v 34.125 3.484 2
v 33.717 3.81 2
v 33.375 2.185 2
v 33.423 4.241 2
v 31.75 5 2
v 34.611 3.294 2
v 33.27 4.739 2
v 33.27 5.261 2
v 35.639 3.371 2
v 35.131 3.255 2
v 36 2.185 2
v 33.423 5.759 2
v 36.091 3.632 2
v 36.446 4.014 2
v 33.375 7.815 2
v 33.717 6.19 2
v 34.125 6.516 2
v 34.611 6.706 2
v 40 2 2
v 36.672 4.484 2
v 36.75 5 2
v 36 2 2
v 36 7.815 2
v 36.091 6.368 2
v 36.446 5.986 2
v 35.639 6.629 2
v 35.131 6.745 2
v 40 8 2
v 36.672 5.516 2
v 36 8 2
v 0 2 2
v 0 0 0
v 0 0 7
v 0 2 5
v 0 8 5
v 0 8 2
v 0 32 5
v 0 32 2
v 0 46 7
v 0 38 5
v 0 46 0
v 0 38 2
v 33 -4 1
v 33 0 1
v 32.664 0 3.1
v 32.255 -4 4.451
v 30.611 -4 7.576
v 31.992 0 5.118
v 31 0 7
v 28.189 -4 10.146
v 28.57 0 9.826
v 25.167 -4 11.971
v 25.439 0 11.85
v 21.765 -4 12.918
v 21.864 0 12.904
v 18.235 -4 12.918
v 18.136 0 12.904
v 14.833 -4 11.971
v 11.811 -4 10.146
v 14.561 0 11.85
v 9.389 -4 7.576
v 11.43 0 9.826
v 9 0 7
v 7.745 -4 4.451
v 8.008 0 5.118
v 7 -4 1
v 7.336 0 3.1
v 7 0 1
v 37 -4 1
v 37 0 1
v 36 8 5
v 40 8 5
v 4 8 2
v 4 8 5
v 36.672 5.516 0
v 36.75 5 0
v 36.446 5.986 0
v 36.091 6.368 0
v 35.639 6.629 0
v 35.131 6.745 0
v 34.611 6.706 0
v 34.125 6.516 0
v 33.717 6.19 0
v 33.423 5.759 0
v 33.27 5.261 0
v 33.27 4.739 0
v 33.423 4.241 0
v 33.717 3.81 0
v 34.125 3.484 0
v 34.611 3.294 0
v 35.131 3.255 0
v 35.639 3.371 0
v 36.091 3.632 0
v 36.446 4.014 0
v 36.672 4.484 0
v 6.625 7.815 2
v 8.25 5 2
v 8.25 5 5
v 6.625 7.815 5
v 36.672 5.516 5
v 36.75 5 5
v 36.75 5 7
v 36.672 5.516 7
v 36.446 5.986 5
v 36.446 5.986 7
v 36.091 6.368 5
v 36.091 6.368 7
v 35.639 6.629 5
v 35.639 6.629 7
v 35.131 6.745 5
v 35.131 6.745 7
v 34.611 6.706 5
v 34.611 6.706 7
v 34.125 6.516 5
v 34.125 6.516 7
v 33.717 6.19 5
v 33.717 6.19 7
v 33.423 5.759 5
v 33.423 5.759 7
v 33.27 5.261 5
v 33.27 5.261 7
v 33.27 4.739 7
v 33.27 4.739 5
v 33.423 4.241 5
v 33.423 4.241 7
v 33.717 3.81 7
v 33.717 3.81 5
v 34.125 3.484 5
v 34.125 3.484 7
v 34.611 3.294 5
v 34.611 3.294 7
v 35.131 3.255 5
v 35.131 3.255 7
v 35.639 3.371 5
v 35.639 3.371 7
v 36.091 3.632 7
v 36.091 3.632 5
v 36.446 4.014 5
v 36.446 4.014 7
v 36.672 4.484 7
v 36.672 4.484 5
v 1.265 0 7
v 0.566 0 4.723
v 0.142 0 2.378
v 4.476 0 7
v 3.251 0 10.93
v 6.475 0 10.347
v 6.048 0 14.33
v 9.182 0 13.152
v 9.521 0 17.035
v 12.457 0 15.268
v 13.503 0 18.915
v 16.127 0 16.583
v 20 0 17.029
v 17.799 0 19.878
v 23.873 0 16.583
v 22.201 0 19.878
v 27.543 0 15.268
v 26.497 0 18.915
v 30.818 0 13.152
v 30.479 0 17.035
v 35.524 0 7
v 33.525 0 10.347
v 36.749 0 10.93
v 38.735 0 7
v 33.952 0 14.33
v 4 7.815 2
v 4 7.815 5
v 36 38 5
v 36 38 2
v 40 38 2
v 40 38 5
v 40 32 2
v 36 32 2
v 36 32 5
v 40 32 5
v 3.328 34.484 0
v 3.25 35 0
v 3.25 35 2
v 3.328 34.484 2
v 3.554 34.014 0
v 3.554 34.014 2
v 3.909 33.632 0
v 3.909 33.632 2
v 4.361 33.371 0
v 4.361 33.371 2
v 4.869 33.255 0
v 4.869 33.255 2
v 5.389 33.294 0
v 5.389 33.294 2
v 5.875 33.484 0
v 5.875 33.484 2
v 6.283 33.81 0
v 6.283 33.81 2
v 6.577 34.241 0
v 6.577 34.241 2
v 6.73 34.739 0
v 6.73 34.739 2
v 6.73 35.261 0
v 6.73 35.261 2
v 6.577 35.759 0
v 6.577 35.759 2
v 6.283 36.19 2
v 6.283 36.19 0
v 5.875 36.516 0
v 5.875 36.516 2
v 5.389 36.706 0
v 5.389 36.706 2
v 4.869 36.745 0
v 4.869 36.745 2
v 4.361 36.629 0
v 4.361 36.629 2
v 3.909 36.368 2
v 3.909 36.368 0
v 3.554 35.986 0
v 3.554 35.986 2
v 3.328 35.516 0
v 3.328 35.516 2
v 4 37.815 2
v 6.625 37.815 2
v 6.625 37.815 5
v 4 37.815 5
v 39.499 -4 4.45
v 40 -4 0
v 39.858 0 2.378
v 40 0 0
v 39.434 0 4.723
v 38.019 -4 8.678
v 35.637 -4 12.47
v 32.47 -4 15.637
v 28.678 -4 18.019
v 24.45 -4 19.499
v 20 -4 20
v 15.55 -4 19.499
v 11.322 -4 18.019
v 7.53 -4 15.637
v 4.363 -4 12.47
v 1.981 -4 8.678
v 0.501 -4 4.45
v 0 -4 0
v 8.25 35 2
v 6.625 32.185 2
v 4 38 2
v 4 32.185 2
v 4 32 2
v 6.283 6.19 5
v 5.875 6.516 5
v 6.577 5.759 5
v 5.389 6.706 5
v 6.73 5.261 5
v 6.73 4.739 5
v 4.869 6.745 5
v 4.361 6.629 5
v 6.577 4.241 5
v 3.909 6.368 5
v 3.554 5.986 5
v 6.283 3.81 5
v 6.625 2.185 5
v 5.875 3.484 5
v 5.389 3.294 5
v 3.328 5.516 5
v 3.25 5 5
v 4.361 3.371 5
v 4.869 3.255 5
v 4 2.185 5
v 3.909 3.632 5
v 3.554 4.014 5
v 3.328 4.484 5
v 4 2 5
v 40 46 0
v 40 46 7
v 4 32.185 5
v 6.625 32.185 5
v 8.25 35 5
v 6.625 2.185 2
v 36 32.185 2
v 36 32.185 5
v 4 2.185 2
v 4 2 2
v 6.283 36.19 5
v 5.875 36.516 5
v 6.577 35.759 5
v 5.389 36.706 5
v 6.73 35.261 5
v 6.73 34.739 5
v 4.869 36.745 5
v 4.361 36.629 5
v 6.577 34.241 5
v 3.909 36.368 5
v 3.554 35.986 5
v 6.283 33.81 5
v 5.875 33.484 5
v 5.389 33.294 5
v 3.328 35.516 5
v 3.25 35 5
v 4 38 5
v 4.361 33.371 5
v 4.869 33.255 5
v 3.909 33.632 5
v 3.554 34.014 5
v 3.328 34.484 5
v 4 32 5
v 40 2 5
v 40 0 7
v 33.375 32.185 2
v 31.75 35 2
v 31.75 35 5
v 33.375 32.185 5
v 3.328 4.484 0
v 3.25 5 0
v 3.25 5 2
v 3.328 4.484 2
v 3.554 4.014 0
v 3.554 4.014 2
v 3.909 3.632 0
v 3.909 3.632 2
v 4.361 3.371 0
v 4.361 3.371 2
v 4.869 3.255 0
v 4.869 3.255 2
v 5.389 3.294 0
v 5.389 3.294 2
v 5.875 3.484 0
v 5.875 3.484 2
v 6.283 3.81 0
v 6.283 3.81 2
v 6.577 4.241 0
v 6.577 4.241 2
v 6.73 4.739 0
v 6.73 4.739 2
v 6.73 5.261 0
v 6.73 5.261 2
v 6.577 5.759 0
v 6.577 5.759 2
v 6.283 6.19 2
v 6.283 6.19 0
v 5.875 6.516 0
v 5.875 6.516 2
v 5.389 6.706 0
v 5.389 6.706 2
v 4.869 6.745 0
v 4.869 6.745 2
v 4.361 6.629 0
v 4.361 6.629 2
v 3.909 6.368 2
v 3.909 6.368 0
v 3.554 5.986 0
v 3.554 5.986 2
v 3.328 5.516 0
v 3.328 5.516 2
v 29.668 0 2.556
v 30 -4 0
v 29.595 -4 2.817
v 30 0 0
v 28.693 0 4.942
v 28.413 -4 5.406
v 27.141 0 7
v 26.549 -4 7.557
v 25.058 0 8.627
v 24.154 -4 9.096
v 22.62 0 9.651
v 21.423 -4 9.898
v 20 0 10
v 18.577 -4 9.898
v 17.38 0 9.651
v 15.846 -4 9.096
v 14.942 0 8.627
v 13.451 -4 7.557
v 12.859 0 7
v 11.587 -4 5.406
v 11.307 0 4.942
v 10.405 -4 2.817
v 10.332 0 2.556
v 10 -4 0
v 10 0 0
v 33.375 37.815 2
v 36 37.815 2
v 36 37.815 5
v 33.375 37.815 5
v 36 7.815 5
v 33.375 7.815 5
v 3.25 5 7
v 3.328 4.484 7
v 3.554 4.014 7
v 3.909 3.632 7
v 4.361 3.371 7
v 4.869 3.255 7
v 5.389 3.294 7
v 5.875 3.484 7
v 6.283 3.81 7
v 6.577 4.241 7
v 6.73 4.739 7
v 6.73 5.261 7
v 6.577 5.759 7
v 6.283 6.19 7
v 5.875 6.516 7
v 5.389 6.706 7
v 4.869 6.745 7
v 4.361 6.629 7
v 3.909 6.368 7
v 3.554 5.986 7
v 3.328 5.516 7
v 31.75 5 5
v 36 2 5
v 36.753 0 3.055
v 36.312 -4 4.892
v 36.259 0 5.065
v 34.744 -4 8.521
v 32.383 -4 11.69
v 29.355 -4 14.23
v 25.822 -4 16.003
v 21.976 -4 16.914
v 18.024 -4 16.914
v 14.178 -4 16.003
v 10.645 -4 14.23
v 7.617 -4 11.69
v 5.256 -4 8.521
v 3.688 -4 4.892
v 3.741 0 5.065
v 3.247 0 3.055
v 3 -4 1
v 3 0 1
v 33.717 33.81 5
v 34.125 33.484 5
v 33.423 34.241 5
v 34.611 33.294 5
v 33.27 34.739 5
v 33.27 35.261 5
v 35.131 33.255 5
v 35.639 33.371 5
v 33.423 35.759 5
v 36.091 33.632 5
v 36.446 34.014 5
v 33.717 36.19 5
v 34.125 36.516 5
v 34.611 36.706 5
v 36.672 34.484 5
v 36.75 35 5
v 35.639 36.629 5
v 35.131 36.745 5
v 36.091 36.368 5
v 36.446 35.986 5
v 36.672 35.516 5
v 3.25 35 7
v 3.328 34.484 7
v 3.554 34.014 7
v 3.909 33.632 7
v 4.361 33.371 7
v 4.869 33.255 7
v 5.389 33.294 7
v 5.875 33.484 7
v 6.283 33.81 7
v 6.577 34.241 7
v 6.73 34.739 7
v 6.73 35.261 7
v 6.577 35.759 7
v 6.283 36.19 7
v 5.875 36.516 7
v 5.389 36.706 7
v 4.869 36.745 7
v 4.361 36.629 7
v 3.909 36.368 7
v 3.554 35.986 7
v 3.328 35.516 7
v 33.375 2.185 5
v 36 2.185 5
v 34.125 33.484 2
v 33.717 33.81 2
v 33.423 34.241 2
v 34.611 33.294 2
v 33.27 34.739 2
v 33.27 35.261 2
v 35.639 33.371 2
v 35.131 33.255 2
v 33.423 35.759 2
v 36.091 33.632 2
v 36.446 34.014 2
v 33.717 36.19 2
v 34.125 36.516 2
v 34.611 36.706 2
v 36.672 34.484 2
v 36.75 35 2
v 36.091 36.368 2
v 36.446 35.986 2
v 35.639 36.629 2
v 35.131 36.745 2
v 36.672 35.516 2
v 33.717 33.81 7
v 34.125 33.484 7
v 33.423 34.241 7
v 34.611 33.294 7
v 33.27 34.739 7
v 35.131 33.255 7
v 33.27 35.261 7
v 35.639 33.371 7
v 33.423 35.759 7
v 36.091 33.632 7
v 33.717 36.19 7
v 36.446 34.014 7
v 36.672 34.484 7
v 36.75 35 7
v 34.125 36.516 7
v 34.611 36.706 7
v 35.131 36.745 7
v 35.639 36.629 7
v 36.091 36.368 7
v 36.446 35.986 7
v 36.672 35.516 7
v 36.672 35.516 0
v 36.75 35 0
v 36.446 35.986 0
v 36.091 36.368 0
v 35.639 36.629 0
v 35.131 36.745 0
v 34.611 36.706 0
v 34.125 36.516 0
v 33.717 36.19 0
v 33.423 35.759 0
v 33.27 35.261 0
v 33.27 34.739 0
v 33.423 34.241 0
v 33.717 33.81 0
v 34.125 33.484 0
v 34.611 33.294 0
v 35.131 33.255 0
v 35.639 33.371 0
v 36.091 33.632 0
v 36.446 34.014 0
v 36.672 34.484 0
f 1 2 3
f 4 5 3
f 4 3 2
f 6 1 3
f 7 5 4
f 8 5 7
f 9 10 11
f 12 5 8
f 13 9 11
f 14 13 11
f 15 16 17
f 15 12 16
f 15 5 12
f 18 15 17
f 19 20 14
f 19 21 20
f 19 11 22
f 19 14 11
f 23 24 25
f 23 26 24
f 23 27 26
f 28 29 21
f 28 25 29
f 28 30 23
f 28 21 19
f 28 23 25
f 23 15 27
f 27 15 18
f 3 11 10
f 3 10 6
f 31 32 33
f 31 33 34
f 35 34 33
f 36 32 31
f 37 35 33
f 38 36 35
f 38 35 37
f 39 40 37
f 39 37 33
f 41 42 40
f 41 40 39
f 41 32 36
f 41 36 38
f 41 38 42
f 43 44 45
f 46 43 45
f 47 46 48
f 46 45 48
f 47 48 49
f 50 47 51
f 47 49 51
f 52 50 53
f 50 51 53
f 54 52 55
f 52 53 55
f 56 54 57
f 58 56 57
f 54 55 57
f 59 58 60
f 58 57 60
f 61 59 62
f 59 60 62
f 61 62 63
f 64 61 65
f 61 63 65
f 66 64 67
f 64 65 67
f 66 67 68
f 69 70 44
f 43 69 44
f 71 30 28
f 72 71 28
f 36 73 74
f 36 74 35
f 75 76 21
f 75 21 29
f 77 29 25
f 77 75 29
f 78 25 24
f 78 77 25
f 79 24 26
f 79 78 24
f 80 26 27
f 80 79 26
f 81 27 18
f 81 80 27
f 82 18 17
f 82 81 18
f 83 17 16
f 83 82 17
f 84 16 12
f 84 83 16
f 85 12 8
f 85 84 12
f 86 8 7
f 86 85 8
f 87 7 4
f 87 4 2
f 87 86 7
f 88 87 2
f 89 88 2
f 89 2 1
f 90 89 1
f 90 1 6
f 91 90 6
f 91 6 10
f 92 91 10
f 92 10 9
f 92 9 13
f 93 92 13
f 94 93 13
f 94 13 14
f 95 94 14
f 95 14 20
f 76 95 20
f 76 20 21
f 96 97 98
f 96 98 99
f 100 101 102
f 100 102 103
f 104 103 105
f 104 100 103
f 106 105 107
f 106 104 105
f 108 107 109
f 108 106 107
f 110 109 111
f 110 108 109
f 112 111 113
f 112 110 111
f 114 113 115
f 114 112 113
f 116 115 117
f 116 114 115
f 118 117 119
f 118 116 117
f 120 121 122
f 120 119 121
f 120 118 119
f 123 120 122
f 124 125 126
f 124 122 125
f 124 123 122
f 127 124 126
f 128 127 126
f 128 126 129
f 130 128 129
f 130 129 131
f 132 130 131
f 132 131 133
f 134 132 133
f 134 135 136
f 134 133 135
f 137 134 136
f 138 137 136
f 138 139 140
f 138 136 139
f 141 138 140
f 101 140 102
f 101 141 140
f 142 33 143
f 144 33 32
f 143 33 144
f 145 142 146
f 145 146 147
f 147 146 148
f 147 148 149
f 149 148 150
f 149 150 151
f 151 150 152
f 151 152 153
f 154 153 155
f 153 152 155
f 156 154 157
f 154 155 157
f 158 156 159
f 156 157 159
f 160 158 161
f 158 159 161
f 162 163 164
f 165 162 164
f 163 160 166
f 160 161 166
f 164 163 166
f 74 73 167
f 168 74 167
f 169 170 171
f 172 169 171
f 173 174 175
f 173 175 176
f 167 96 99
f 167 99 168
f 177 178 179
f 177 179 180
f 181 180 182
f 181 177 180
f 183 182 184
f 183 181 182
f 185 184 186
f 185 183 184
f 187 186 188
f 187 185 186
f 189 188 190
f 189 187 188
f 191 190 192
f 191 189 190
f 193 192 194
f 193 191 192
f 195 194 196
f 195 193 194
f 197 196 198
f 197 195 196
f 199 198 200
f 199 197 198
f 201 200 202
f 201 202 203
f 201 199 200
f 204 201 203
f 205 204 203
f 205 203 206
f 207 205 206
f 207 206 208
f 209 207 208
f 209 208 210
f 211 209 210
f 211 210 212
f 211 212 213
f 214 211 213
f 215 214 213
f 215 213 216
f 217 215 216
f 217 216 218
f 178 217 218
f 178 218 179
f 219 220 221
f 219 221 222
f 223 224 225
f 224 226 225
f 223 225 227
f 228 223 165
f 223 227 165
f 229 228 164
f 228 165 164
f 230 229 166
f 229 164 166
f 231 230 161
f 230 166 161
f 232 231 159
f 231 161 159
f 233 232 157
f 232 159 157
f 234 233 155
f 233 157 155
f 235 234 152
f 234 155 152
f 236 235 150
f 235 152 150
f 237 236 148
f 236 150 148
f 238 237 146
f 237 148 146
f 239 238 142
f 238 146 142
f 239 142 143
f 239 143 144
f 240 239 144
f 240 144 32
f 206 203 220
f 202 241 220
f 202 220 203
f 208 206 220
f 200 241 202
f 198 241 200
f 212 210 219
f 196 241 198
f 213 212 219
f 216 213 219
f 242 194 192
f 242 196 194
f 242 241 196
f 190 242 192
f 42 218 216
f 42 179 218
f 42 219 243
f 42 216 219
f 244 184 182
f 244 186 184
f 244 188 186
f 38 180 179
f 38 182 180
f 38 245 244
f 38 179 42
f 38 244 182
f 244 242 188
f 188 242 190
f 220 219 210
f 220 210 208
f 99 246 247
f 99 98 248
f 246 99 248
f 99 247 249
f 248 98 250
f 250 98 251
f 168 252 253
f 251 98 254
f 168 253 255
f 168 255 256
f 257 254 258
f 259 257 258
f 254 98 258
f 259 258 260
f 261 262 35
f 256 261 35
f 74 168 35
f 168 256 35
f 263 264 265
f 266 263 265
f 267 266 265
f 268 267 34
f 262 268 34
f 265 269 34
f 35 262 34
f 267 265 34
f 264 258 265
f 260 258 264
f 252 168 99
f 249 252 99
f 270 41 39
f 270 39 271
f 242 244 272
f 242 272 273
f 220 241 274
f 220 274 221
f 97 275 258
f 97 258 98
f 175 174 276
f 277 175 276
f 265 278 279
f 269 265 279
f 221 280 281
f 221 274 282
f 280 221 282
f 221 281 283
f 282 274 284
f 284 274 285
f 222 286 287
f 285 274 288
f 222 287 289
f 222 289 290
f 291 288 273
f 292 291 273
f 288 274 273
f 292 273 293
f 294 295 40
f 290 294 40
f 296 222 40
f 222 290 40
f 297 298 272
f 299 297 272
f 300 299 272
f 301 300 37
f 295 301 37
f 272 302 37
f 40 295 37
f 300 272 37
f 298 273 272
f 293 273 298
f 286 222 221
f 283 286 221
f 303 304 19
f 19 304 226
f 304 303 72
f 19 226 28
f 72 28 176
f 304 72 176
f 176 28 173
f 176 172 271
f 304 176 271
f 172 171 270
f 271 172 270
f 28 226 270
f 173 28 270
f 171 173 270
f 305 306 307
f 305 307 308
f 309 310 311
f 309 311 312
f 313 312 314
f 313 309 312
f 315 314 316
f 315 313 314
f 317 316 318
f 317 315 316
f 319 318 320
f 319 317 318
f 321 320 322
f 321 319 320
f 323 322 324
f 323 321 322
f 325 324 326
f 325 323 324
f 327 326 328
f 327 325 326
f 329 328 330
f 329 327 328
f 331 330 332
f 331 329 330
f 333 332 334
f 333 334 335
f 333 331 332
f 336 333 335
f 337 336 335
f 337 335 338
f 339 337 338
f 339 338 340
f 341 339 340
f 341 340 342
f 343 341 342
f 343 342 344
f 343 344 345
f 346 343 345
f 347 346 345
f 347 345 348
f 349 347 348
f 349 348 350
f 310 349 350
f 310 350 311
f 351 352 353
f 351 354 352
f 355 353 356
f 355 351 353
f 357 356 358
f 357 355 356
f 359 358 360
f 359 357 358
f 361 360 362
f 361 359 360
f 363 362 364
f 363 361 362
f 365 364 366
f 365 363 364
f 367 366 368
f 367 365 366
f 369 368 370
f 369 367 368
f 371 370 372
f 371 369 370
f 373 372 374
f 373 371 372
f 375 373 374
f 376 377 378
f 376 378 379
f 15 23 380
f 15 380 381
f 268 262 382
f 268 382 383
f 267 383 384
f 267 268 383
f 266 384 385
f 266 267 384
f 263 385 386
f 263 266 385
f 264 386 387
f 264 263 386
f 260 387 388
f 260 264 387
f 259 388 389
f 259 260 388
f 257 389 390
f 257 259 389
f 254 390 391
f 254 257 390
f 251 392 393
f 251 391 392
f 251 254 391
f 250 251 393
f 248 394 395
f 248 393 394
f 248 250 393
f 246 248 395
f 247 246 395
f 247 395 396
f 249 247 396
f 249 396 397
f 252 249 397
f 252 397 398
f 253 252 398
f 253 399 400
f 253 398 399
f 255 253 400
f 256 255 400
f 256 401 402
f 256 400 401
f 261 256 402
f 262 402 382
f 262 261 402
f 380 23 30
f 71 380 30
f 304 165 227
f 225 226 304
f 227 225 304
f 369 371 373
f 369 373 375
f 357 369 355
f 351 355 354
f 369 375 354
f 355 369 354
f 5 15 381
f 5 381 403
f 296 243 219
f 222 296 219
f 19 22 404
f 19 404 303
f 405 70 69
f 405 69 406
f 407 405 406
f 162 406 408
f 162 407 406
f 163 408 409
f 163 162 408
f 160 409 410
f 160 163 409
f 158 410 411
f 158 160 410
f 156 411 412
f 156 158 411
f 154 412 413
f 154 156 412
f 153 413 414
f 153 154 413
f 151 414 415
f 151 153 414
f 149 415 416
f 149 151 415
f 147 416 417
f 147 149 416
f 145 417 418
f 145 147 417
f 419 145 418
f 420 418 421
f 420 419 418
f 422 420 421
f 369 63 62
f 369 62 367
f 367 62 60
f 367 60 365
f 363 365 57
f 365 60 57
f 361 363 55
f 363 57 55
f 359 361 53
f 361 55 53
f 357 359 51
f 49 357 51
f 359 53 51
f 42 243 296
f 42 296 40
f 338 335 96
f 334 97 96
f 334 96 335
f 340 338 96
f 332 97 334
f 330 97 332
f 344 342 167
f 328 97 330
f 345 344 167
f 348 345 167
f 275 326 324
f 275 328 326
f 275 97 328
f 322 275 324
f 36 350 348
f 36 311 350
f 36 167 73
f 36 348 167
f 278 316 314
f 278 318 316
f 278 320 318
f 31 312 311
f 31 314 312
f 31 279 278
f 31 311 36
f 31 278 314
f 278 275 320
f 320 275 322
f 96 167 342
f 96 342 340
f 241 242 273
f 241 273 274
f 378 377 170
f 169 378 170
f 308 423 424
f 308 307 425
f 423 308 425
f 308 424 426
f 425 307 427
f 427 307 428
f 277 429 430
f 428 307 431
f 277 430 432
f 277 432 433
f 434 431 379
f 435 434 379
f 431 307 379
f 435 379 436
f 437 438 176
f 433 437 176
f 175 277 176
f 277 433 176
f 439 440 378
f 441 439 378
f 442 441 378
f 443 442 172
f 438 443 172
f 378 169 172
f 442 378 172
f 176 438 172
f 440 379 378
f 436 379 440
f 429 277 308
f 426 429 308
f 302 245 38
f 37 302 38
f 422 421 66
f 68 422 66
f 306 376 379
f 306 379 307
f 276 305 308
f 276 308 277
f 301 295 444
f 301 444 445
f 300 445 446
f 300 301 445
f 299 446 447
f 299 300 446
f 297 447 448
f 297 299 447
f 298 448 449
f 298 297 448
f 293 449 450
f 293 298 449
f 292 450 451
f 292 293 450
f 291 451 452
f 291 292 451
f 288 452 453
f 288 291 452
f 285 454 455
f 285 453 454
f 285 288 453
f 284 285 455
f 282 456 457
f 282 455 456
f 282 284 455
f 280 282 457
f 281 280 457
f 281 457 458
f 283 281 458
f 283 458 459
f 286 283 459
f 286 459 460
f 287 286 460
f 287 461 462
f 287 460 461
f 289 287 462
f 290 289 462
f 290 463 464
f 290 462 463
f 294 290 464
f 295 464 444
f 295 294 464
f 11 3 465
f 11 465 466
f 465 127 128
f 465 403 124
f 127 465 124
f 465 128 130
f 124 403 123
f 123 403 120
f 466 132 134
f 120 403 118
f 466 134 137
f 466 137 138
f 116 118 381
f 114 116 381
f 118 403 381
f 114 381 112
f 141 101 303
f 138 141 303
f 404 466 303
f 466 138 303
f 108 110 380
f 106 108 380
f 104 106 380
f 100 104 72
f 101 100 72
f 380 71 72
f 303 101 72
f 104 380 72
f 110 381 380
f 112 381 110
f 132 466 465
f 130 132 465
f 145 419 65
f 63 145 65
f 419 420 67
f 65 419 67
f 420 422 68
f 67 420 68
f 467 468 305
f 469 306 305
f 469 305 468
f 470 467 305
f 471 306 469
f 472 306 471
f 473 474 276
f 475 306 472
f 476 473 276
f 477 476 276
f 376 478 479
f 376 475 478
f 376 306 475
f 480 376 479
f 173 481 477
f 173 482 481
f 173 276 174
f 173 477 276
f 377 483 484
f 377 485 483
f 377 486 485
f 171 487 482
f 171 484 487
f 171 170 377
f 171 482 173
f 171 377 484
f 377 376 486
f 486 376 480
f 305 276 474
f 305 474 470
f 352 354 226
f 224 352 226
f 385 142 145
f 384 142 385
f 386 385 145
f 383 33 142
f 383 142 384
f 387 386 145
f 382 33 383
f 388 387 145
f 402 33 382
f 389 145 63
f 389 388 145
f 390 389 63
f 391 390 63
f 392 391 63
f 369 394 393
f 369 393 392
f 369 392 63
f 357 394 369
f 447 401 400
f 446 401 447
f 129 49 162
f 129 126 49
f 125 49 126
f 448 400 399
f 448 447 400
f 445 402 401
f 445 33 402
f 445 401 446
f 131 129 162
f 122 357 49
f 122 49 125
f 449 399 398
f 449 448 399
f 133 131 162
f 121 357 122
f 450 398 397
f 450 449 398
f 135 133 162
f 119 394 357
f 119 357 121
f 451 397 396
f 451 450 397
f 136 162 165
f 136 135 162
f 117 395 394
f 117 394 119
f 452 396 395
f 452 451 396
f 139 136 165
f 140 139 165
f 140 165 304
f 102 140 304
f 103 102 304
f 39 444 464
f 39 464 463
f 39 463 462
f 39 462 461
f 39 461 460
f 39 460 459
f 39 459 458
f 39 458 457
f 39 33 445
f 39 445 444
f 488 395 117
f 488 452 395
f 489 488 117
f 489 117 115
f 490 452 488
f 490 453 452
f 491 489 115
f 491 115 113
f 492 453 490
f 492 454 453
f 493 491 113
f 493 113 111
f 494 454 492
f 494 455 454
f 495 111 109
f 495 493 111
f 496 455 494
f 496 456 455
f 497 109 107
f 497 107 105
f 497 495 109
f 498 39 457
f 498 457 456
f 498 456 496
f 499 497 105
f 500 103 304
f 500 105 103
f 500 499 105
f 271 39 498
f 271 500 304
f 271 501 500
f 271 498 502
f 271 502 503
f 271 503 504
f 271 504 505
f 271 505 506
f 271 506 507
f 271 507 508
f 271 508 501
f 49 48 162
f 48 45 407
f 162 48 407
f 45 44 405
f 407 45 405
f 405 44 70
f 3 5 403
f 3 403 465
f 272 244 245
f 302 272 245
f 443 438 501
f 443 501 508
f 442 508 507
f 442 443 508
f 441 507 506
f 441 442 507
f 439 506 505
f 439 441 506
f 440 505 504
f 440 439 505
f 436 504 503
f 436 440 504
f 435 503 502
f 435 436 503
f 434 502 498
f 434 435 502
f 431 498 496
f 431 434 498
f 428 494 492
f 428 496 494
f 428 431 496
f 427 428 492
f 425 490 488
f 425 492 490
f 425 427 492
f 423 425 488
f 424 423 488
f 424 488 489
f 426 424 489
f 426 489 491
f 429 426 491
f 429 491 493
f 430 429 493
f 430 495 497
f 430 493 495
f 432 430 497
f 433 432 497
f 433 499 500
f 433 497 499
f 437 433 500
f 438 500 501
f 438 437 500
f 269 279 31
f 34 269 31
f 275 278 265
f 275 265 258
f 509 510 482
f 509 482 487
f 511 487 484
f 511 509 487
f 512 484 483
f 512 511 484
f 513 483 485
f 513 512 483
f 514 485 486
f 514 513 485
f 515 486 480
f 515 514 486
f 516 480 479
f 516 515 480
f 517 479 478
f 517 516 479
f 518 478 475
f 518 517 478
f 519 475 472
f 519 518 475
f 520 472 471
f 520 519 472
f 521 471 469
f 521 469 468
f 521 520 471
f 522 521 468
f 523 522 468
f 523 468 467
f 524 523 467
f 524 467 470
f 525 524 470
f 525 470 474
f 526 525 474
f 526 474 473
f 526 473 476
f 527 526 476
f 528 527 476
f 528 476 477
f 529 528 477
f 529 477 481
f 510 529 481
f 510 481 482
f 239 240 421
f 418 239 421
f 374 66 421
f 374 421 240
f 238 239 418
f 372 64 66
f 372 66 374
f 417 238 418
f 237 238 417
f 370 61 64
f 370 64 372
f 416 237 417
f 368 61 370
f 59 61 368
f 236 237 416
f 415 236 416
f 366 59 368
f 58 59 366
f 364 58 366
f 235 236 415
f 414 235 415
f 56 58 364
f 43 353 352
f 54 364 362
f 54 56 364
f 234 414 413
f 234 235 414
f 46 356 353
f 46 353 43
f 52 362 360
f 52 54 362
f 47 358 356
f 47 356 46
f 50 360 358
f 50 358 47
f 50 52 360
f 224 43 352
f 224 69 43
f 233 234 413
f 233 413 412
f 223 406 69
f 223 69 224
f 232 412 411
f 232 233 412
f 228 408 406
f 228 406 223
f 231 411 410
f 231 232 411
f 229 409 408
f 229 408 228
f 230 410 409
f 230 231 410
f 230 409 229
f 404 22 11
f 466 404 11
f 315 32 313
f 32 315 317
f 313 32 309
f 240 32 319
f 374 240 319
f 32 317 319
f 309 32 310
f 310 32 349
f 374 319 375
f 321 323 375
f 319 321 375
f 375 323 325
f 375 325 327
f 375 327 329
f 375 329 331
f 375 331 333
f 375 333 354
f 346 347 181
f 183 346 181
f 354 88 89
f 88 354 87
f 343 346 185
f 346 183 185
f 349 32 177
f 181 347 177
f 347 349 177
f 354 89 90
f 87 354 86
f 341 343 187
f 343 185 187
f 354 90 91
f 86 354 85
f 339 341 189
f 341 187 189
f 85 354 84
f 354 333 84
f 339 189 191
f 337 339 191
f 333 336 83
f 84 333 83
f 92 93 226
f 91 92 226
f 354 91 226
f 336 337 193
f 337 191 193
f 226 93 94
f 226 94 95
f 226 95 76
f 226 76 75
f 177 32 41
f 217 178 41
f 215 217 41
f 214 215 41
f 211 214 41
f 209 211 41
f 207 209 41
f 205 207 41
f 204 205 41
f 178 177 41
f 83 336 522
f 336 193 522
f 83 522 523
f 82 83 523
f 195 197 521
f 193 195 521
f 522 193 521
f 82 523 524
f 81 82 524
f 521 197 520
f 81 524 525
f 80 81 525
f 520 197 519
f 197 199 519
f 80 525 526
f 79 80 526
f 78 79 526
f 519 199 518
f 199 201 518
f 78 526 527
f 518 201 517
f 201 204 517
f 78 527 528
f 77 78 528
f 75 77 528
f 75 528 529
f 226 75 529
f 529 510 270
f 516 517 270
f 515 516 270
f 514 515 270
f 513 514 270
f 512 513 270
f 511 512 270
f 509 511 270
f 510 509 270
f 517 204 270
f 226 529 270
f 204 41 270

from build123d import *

# Parameters (mm, degrees)
CYLINDER004_R             = 1.75
CYLINDER004_DEPTH         = 30
BOX005_W                  = 20
BOX005_H                  = 6
BOX005_DEPTH              = 3
PRISM004_DEPTH            = 3
FUSION004_PLACEMENT_ANGLE = 180
CYLINDER003_R             = 1.75
CYLINDER003_DEPTH         = 30
BOX004_W                  = 20
BOX004_H                  = 6
BOX004_DEPTH              = 3
PRISM003_DEPTH            = 3
FUSION003_PLACEMENT_ANGLE = 180
CYLINDER002_R             = 1.75
CYLINDER002_DEPTH         = 30
BOX003_W                  = 20
BOX003_H                  = 6
BOX003_DEPTH              = 3
PRISM002_DEPTH            = 3
CYLINDER001_R             = 1.75
CYLINDER001_DEPTH         = 30
BOX002_W                  = 20
BOX002_H                  = 6
BOX002_DEPTH              = 3
PRISM001_DEPTH            = 3
BOX_W                     = 40
BOX_H                     = 46
BOX_DEPTH                 = 7
PAD_DEPTH                 = 4


with BuildPart() as cilindro004:
    # Cylinder004 → Cylinder004 (new body)
    with BuildSketch(Plane.XY.offset(-5)):
        Circle(CYLINDER004_R)
    extrude(amount=CYLINDER004_DEPTH)


with BuildPart() as cubo005:
    # Box005 → Box005 (new body)
    with BuildSketch(Plane(origin=(1, -3, 0), x_dir=(1, 0, 0), z_dir=(0, 0, 1))):
        with Locations((10, 3)):
            Rectangle(BOX005_W, BOX005_H)
    extrude(amount=BOX005_DEPTH)


with BuildPart() as fusion004:
    # Prism004 → Prism004 (new body)
    with BuildSketch(Plane.XY):
        Polygon((3.25, 0), (1.625, 2.814583), (-1.625, 2.814583), (-3.25, 0), (-1.625, -2.814583), (1.625, -2.814583), align=None)
    extrude(amount=PRISM004_DEPTH)

    # Fusion004: union Cilindro004, Cubo005
    add(cilindro004.part)
    add(cubo005.part)


with BuildPart() as fusion004_1:
    # Fusion004 placement: moved
    add(fusion004.part.moved(Location((5, 35, 2))).rotate(Axis((5, 35, 2), (0, 0, 1)), FUSION004_PLACEMENT_ANGLE))


with BuildPart() as cilindro003:
    # Cylinder003 → Cylinder003 (new body)
    with BuildSketch(Plane.XY.offset(-5)):
        Circle(CYLINDER003_R)
    extrude(amount=CYLINDER003_DEPTH)


with BuildPart() as cubo004:
    # Box004 → Box004 (new body)
    with BuildSketch(Plane(origin=(1, -3, 0), x_dir=(1, 0, 0), z_dir=(0, 0, 1))):
        with Locations((10, 3)):
            Rectangle(BOX004_W, BOX004_H)
    extrude(amount=BOX004_DEPTH)


with BuildPart() as fusion003:
    # Prism003 → Prism003 (new body)
    with BuildSketch(Plane.XY):
        Polygon((3.25, 0), (1.625, 2.814583), (-1.625, 2.814583), (-3.25, 0), (-1.625, -2.814583), (1.625, -2.814583), align=None)
    extrude(amount=PRISM003_DEPTH)

    # Fusion003: union Cilindro003, Cubo004
    add(cilindro003.part)
    add(cubo004.part)


with BuildPart() as fusion003_1:
    # Fusion003 placement: moved
    add(fusion003.part.moved(Location((5, 5, 2))).rotate(Axis((5, 5, 2), (0, 0, 1)), FUSION003_PLACEMENT_ANGLE))


with BuildPart() as cilindro002:
    # Cylinder002 → Cylinder002 (new body)
    with BuildSketch(Plane.XY.offset(-5)):
        Circle(CYLINDER002_R)
    extrude(amount=CYLINDER002_DEPTH)


with BuildPart() as cubo003:
    # Box003 → Box003 (new body)
    with BuildSketch(Plane(origin=(1, -3, 0), x_dir=(1, 0, 0), z_dir=(0, 0, 1))):
        with Locations((10, 3)):
            Rectangle(BOX003_W, BOX003_H)
    extrude(amount=BOX003_DEPTH)


with BuildPart() as fusion002:
    # Prism002 → Prism002 (new body)
    with BuildSketch(Plane.XY):
        Polygon((3.25, 0), (1.625, 2.814583), (-1.625, 2.814583), (-3.25, 0), (-1.625, -2.814583), (1.625, -2.814583), align=None)
    extrude(amount=PRISM002_DEPTH)

    # Fusion002: union Cilindro002, Cubo003
    add(cilindro002.part)
    add(cubo003.part)


with BuildPart() as fusion002_1:
    # Fusion002 placement: moved
    add(fusion002.part.moved(Location((35, 35, 2))))


with BuildPart() as cilindro001:
    # Cylinder001 → Cylinder001 (new body)
    with BuildSketch(Plane.XY.offset(-5)):
        Circle(CYLINDER001_R)
    extrude(amount=CYLINDER001_DEPTH)


with BuildPart() as cubo002:
    # Box002 → Box002 (new body)
    with BuildSketch(Plane(origin=(1, -3, 0), x_dir=(1, 0, 0), z_dir=(0, 0, 1))):
        with Locations((10, 3)):
            Rectangle(BOX002_W, BOX002_H)
    extrude(amount=BOX002_DEPTH)


with BuildPart() as fusion001:
    # Prism001 → Prism001 (new body)
    with BuildSketch(Plane.XY):
        Polygon((3.25, 0), (1.625, 2.814583), (-1.625, 2.814583), (-3.25, 0), (-1.625, -2.814583), (1.625, -2.814583), align=None)
    extrude(amount=PRISM001_DEPTH)

    # Fusion001: union Cilindro001, Cubo002
    add(cilindro001.part)
    add(cubo002.part)


with BuildPart() as fusion001_1:
    # Fusion001 placement: moved
    add(fusion001.part.moved(Location((35, 5, 2))))


with BuildPart() as body:
    # Box → Box (new body)
    with BuildSketch(Plane.XY):
        with Locations((20, 23)):
            Rectangle(BOX_W, BOX_H)
    extrude(amount=BOX_DEPTH)

    # Cut: cut Fusion001
    add(fusion001_1.part, mode=Mode.SUBTRACT)

    # Cut001: cut Fusion002
    add(fusion002_1.part, mode=Mode.SUBTRACT)

    # Cut002: cut Fusion003
    add(fusion003_1.part, mode=Mode.SUBTRACT)

    # Cut003: cut Fusion004
    add(fusion004_1.part, mode=Mode.SUBTRACT)

    # Sketch → Pad (new body)
    with BuildSketch(Plane.XZ):
        with BuildLine():
            Line((0, 0), (10, 0))
            ThreePointArc((30, -2.8e-05), (20.000014, 9.999972), (10, 0))
            Line((30, -2.8e-05), (40, -2.8e-05))
            ThreePointArc((40, -2.8e-05), (20.000014, 19.999972), (0, 0))
        make_face()
        with BuildLine():
            ThreePointArc((37, 1), (20, 17.02936), (3, 1))
            Line((3, 1), (7, 1))
            ThreePointArc((33, 1), (20, 13.038379), (7, 1))
            Line((37, 1), (33, 1))
        make_face(mode=Mode.SUBTRACT)
    extrude(amount=PAD_DEPTH)


solid = body.part
